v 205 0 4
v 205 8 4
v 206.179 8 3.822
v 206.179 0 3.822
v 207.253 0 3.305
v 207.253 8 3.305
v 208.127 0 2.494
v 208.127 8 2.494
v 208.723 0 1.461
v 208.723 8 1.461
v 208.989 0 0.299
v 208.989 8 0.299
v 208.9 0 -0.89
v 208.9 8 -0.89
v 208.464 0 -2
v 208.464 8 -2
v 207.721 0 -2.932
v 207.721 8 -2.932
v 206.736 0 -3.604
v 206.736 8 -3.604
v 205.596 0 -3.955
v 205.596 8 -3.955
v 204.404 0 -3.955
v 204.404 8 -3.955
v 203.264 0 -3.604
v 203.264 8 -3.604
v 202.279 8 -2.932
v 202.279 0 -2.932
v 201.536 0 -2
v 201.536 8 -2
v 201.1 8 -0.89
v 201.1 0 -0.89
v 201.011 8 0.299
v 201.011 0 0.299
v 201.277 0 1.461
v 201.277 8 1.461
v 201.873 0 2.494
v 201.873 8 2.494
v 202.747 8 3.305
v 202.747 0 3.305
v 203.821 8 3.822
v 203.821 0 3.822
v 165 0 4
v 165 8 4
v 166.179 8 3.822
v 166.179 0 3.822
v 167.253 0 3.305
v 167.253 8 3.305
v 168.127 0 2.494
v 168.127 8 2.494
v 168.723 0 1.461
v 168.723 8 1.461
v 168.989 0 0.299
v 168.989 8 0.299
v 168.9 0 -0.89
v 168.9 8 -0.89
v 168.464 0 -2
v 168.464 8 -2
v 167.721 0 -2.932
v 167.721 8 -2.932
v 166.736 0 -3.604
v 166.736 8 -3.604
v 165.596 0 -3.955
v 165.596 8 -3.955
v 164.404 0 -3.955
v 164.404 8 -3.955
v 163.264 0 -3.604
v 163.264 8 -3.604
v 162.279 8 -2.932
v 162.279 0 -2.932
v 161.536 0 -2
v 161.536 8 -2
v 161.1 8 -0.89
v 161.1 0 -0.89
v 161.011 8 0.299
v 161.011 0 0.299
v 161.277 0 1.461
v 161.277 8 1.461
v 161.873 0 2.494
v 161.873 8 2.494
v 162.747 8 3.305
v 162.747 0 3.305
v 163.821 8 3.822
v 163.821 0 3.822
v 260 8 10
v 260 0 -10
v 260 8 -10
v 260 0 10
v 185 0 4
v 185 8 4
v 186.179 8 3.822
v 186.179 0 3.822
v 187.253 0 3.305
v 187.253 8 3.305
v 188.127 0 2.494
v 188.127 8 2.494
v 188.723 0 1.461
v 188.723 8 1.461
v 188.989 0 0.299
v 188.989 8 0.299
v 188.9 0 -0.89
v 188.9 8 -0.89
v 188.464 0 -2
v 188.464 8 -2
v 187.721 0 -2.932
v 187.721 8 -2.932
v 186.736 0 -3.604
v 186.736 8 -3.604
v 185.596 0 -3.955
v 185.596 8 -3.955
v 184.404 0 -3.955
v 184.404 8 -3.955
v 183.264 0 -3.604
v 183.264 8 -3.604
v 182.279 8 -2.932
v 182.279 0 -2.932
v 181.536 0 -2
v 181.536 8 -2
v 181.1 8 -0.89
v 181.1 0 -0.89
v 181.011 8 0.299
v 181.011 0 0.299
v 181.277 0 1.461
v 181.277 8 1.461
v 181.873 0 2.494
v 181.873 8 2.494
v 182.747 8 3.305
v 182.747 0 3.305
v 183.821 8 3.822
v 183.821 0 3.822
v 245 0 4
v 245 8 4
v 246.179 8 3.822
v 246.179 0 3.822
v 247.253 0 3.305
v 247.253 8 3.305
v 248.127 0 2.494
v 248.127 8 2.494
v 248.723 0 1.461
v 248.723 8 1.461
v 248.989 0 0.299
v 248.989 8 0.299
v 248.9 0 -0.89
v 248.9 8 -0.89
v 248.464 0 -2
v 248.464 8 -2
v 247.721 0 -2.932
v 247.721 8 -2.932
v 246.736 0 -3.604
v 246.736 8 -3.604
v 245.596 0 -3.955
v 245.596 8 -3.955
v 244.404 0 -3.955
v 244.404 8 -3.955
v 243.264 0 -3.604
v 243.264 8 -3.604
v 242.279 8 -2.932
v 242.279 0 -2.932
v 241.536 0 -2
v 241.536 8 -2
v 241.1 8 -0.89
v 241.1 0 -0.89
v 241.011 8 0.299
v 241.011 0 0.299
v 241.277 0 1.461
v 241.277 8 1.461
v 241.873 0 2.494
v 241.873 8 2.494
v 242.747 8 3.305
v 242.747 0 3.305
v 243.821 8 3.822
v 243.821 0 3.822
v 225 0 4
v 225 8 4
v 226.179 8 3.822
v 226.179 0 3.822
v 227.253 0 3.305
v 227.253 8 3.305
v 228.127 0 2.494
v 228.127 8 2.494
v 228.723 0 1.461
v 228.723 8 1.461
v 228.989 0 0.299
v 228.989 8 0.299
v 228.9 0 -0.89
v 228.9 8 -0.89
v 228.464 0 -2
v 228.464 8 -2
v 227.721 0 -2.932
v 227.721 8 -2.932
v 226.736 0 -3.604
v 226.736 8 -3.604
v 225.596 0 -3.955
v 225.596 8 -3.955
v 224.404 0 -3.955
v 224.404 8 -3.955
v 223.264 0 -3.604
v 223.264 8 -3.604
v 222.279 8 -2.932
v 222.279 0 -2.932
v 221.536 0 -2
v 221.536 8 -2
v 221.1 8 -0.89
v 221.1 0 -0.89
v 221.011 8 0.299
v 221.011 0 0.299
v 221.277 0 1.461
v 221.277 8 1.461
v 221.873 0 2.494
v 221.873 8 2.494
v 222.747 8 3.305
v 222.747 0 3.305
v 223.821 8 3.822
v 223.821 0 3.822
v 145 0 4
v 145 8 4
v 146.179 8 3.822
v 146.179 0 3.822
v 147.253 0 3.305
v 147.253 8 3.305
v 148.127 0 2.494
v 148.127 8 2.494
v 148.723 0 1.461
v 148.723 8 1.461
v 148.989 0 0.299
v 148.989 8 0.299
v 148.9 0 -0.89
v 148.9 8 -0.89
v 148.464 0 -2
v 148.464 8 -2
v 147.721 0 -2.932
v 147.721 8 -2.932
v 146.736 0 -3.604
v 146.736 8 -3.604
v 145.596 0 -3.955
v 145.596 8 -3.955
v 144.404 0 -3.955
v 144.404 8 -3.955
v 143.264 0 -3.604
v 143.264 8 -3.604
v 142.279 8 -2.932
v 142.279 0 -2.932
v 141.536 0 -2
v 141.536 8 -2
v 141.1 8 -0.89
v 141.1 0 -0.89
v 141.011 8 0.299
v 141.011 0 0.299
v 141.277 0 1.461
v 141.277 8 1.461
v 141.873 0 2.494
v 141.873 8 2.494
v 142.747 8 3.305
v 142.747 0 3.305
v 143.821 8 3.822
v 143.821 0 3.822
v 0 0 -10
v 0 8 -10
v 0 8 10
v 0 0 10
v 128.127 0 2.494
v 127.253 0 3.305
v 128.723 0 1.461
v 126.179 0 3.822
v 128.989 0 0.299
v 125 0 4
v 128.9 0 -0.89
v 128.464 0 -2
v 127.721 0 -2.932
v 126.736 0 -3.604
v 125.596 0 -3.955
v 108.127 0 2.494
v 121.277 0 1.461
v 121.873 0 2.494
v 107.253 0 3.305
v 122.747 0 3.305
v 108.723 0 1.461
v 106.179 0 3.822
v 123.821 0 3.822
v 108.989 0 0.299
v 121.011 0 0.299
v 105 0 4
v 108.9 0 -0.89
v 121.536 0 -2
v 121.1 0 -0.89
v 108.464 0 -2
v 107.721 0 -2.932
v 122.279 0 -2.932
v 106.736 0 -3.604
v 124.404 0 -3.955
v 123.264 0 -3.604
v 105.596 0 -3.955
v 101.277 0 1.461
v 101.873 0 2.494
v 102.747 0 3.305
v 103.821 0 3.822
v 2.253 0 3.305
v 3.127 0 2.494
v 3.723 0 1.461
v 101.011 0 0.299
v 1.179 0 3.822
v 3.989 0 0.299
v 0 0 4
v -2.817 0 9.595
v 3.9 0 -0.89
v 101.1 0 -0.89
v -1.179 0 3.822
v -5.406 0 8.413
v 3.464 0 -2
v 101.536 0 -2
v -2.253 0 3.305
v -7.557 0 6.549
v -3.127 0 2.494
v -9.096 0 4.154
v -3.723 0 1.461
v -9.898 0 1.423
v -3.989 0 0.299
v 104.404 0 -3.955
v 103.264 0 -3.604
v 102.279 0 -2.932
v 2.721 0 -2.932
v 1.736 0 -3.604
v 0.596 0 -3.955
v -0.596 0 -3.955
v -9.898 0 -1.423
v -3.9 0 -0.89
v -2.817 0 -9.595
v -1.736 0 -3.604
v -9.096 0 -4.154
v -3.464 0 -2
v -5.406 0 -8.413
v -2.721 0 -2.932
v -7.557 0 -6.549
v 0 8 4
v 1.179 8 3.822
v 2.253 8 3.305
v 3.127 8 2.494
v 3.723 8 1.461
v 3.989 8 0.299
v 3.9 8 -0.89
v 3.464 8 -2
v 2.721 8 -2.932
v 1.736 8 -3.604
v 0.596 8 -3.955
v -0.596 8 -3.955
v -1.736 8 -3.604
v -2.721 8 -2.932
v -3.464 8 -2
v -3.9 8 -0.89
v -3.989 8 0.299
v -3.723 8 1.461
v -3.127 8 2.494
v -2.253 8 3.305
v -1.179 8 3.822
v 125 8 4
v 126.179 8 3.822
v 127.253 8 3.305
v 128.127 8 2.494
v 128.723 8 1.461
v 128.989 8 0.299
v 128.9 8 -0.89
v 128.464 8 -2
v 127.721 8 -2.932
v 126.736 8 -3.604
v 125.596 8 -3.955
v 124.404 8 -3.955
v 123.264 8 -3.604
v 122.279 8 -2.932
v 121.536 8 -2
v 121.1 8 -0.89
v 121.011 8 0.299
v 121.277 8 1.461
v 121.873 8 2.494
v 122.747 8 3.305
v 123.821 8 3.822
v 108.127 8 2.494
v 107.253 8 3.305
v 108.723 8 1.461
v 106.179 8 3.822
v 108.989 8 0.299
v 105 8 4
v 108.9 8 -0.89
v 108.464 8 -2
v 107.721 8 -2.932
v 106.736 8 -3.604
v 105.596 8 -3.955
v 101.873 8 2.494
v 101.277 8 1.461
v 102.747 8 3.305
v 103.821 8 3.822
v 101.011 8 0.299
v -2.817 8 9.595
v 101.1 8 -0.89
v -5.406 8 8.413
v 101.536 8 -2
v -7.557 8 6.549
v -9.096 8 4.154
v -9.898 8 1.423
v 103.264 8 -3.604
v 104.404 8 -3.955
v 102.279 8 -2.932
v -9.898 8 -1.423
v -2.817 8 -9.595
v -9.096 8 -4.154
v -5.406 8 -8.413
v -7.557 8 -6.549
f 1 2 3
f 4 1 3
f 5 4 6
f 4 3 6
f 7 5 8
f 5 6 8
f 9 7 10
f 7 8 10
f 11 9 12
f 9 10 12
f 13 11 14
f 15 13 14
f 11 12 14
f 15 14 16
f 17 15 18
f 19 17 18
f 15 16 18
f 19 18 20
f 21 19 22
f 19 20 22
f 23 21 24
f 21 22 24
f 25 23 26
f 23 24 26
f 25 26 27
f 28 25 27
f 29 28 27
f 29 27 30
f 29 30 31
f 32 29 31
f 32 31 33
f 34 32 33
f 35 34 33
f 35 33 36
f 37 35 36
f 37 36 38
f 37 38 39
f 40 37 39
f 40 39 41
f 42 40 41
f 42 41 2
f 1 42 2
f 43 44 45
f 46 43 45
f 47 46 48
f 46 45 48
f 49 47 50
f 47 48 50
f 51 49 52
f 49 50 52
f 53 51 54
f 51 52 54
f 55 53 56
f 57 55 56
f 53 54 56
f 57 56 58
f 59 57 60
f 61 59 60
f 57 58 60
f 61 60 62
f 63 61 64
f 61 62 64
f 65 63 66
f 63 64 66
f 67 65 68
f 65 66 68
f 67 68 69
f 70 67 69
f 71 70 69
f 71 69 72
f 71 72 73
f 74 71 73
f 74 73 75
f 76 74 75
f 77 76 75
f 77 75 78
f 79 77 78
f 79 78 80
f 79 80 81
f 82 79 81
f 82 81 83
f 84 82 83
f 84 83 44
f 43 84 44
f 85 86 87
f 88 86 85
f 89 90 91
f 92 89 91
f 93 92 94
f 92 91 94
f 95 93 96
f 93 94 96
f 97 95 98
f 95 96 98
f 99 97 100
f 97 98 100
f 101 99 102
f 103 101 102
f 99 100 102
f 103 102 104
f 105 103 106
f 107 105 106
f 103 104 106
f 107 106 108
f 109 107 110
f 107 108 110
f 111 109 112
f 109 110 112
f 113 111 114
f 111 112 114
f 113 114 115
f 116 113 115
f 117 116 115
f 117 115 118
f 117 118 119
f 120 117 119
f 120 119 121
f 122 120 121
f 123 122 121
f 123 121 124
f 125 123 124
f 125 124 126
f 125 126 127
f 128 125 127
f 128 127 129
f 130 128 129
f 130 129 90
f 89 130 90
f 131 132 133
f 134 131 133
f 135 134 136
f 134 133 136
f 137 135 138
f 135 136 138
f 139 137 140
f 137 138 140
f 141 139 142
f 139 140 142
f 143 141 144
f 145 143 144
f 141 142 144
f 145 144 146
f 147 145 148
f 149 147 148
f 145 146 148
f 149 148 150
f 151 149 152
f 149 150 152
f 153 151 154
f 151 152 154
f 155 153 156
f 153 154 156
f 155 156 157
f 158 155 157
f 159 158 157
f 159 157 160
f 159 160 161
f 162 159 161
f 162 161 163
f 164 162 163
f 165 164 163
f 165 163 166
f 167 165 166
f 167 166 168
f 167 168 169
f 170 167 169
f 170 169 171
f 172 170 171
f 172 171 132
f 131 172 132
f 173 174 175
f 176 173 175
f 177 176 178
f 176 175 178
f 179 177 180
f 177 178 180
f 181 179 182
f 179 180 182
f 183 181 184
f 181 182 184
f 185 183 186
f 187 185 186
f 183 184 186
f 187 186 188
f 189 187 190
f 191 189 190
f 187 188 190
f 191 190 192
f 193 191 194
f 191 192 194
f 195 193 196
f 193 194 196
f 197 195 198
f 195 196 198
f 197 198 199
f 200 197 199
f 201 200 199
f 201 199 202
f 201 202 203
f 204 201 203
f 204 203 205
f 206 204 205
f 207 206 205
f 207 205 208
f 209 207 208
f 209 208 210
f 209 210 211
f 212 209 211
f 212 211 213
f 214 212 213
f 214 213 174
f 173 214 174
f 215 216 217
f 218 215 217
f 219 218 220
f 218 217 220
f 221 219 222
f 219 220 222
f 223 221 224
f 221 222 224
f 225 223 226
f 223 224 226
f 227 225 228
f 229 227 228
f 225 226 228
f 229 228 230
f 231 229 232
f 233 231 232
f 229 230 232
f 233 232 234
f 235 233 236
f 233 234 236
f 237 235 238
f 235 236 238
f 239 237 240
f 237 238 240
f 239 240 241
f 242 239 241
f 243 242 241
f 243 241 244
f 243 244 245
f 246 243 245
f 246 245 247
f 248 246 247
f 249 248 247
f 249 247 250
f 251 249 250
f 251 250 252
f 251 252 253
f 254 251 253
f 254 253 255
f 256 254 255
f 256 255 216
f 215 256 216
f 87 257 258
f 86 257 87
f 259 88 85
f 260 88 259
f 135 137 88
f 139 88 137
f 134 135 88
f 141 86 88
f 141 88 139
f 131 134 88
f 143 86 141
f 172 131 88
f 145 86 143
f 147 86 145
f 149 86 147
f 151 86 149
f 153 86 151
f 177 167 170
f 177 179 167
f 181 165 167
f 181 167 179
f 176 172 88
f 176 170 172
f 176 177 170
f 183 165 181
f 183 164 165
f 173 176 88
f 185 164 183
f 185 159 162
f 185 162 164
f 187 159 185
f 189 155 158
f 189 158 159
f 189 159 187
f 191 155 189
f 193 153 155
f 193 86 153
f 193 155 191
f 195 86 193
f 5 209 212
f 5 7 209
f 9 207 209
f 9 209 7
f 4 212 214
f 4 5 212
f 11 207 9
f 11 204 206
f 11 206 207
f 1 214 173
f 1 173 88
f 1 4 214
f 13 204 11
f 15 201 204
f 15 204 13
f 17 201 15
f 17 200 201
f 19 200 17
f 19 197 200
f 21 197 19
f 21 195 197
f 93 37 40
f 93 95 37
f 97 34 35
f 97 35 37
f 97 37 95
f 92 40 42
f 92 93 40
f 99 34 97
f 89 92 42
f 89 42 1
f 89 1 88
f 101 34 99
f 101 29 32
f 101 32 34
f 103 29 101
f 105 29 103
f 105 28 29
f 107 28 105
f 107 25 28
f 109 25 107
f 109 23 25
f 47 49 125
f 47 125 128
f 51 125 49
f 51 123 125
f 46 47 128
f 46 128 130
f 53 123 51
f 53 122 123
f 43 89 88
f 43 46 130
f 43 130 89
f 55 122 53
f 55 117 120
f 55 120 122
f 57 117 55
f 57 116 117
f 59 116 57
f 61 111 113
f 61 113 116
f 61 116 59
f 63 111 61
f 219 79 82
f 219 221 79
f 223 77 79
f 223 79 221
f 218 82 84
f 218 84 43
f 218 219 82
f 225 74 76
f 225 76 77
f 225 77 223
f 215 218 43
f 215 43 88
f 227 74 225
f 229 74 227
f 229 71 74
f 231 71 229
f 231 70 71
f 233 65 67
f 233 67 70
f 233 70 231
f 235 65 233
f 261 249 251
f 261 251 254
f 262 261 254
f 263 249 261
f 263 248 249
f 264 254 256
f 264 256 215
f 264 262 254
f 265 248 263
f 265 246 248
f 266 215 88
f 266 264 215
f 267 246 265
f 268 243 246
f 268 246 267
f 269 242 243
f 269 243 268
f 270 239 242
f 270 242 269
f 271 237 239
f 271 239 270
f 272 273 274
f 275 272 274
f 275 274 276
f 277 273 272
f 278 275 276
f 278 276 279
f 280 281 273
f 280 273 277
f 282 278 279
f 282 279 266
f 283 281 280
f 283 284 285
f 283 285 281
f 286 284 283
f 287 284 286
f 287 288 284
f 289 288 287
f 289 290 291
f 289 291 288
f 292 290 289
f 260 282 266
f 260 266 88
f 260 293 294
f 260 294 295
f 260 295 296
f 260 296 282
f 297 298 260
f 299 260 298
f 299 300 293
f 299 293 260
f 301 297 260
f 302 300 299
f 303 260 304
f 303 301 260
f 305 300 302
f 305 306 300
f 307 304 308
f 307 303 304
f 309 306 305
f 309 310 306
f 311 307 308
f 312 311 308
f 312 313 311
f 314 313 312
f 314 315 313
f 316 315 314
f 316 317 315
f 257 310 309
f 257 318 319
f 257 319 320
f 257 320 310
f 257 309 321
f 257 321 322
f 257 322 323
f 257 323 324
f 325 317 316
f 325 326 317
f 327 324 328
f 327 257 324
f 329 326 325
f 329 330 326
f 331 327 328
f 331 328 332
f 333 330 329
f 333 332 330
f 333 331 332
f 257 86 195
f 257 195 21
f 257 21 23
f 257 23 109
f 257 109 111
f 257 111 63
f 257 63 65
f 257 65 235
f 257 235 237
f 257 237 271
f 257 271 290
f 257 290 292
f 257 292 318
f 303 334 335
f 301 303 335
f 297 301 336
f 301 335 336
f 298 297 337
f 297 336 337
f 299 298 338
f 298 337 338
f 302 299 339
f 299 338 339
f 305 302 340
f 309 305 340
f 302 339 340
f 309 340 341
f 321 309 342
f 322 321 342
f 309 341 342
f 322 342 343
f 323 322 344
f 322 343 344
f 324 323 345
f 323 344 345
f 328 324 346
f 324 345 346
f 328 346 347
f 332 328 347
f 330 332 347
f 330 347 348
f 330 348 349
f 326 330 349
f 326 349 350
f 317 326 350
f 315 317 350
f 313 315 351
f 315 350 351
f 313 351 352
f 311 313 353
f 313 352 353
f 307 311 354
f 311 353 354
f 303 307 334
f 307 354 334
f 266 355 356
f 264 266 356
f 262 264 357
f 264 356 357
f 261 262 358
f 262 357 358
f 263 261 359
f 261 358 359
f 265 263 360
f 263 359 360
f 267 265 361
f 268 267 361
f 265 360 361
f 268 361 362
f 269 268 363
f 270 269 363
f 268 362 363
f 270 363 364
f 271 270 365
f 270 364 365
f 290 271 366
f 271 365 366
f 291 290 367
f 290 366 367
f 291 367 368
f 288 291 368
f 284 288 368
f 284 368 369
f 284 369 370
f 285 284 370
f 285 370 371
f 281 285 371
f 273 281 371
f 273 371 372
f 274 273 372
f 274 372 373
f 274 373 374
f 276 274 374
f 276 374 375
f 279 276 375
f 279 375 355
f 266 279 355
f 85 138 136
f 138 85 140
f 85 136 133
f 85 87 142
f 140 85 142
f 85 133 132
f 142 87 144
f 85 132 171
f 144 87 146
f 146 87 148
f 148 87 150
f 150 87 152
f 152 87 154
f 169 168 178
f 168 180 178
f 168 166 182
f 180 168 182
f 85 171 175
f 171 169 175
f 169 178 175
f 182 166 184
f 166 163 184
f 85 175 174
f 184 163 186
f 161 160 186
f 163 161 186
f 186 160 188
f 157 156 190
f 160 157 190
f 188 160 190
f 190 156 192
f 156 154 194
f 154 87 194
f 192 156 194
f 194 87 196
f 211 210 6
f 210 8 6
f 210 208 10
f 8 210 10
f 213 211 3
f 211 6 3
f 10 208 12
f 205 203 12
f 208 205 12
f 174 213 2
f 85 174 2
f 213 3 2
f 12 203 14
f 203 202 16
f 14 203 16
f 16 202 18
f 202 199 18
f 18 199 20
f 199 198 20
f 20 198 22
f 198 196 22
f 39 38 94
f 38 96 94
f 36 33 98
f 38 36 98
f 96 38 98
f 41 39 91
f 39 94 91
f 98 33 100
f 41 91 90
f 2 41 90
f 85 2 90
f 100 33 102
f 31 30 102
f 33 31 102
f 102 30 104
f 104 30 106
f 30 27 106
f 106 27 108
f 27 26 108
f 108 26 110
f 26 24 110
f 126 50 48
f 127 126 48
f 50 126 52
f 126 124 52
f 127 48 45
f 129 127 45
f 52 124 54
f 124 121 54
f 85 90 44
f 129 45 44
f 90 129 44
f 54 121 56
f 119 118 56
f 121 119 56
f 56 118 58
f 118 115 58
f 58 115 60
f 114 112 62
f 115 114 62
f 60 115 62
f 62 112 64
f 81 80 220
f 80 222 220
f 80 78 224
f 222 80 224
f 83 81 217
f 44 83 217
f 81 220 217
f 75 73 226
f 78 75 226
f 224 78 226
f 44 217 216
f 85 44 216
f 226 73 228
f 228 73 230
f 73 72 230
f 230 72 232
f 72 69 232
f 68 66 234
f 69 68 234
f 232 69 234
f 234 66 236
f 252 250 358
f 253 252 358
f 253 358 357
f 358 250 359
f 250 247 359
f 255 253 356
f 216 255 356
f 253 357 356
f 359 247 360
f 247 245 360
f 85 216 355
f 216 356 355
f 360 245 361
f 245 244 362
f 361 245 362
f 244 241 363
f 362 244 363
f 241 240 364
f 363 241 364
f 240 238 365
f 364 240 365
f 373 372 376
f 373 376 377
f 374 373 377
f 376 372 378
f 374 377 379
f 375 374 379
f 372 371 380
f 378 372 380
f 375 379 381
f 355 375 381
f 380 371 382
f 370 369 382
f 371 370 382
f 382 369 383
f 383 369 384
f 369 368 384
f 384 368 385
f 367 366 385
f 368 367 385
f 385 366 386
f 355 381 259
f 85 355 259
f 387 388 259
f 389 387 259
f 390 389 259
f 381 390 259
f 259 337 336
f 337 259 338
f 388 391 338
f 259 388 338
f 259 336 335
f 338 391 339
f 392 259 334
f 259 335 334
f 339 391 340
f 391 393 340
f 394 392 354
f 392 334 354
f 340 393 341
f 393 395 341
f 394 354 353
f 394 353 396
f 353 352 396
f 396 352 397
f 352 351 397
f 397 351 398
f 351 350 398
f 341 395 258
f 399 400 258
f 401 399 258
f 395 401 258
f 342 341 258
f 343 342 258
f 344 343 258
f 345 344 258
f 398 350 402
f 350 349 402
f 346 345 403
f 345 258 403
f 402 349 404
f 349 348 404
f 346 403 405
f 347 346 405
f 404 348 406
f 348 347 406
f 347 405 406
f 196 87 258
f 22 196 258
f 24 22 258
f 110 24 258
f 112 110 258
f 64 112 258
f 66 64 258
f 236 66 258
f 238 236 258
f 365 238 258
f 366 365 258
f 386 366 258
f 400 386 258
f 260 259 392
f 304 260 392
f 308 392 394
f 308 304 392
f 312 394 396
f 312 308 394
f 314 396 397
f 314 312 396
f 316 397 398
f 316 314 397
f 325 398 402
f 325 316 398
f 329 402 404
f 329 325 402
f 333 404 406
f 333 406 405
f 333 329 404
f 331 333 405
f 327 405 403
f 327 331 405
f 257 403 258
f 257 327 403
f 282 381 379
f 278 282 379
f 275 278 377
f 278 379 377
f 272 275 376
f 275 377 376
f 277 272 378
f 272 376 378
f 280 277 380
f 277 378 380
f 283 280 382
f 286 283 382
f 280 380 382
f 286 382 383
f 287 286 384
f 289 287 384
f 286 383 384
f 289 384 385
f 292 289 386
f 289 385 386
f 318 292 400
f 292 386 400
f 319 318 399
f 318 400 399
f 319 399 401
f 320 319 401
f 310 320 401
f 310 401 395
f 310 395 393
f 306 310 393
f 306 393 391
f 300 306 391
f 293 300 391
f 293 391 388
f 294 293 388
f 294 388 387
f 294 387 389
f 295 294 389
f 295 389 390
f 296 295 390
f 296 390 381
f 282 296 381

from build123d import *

# Parameters (mm, degrees)
BOSS_EXTRUDE1_DEPTH = 8
SKETCH2_R           = 4
CUT_EXTRUDE1_DEPTH  = 8
SKETCH3_R           = 4
CUT_EXTRUDE2_DEPTH  = 10
LPATTERN1_COUNT     = 8
LPATTERN1_PITCH     = 20


with BuildPart() as part:
    # Sketch1 → Boss-Extrude1 (new body)
    with BuildSketch(Plane(origin=(0, 0, 0), x_dir=(1, 0, 0), z_dir=(0, 1, 0))):
        with BuildLine():
            Line((0, 10), (260, 10))
            Line((260, 10), (260, -10))
            Line((260, -10), (0, -10))
            ThreePointArc((0, -10), (-10, 0), (0, 10))
        make_face()
    extrude(amount=BOSS_EXTRUDE1_DEPTH)

    # Sketch2 → Cut-Extrude1 (cut)
    with BuildSketch(Plane(origin=(0, 8, 0), x_dir=(1, 0, 0), z_dir=(0, 1, 0))):
        with Locations(Location((0, 0, 0), (0, 0, 270))):
            Circle(SKETCH2_R)
    extrude(amount=-CUT_EXTRUDE1_DEPTH, mode=Mode.SUBTRACT)

    # Sketch3 → Cut-Extrude2 (cut)
    with BuildSketch(Plane(origin=(0, 8, 0), x_dir=(1, 0, 0), z_dir=(0, 1, 0))):
        with Locations(Location((245, 0, 0), (0, 0, 270))):
            Circle(SKETCH3_R)
    cut_extrude2 = extrude(amount=-CUT_EXTRUDE2_DEPTH, mode=Mode.SUBTRACT)

    # LPattern1: Cut-Extrude2 ×8
    with Locations(*[(-i * LPATTERN1_PITCH, 0, 0) for i in range(1, LPATTERN1_COUNT)]):
        add(cut_extrude2, mode=Mode.SUBTRACT)


solid = part.part
